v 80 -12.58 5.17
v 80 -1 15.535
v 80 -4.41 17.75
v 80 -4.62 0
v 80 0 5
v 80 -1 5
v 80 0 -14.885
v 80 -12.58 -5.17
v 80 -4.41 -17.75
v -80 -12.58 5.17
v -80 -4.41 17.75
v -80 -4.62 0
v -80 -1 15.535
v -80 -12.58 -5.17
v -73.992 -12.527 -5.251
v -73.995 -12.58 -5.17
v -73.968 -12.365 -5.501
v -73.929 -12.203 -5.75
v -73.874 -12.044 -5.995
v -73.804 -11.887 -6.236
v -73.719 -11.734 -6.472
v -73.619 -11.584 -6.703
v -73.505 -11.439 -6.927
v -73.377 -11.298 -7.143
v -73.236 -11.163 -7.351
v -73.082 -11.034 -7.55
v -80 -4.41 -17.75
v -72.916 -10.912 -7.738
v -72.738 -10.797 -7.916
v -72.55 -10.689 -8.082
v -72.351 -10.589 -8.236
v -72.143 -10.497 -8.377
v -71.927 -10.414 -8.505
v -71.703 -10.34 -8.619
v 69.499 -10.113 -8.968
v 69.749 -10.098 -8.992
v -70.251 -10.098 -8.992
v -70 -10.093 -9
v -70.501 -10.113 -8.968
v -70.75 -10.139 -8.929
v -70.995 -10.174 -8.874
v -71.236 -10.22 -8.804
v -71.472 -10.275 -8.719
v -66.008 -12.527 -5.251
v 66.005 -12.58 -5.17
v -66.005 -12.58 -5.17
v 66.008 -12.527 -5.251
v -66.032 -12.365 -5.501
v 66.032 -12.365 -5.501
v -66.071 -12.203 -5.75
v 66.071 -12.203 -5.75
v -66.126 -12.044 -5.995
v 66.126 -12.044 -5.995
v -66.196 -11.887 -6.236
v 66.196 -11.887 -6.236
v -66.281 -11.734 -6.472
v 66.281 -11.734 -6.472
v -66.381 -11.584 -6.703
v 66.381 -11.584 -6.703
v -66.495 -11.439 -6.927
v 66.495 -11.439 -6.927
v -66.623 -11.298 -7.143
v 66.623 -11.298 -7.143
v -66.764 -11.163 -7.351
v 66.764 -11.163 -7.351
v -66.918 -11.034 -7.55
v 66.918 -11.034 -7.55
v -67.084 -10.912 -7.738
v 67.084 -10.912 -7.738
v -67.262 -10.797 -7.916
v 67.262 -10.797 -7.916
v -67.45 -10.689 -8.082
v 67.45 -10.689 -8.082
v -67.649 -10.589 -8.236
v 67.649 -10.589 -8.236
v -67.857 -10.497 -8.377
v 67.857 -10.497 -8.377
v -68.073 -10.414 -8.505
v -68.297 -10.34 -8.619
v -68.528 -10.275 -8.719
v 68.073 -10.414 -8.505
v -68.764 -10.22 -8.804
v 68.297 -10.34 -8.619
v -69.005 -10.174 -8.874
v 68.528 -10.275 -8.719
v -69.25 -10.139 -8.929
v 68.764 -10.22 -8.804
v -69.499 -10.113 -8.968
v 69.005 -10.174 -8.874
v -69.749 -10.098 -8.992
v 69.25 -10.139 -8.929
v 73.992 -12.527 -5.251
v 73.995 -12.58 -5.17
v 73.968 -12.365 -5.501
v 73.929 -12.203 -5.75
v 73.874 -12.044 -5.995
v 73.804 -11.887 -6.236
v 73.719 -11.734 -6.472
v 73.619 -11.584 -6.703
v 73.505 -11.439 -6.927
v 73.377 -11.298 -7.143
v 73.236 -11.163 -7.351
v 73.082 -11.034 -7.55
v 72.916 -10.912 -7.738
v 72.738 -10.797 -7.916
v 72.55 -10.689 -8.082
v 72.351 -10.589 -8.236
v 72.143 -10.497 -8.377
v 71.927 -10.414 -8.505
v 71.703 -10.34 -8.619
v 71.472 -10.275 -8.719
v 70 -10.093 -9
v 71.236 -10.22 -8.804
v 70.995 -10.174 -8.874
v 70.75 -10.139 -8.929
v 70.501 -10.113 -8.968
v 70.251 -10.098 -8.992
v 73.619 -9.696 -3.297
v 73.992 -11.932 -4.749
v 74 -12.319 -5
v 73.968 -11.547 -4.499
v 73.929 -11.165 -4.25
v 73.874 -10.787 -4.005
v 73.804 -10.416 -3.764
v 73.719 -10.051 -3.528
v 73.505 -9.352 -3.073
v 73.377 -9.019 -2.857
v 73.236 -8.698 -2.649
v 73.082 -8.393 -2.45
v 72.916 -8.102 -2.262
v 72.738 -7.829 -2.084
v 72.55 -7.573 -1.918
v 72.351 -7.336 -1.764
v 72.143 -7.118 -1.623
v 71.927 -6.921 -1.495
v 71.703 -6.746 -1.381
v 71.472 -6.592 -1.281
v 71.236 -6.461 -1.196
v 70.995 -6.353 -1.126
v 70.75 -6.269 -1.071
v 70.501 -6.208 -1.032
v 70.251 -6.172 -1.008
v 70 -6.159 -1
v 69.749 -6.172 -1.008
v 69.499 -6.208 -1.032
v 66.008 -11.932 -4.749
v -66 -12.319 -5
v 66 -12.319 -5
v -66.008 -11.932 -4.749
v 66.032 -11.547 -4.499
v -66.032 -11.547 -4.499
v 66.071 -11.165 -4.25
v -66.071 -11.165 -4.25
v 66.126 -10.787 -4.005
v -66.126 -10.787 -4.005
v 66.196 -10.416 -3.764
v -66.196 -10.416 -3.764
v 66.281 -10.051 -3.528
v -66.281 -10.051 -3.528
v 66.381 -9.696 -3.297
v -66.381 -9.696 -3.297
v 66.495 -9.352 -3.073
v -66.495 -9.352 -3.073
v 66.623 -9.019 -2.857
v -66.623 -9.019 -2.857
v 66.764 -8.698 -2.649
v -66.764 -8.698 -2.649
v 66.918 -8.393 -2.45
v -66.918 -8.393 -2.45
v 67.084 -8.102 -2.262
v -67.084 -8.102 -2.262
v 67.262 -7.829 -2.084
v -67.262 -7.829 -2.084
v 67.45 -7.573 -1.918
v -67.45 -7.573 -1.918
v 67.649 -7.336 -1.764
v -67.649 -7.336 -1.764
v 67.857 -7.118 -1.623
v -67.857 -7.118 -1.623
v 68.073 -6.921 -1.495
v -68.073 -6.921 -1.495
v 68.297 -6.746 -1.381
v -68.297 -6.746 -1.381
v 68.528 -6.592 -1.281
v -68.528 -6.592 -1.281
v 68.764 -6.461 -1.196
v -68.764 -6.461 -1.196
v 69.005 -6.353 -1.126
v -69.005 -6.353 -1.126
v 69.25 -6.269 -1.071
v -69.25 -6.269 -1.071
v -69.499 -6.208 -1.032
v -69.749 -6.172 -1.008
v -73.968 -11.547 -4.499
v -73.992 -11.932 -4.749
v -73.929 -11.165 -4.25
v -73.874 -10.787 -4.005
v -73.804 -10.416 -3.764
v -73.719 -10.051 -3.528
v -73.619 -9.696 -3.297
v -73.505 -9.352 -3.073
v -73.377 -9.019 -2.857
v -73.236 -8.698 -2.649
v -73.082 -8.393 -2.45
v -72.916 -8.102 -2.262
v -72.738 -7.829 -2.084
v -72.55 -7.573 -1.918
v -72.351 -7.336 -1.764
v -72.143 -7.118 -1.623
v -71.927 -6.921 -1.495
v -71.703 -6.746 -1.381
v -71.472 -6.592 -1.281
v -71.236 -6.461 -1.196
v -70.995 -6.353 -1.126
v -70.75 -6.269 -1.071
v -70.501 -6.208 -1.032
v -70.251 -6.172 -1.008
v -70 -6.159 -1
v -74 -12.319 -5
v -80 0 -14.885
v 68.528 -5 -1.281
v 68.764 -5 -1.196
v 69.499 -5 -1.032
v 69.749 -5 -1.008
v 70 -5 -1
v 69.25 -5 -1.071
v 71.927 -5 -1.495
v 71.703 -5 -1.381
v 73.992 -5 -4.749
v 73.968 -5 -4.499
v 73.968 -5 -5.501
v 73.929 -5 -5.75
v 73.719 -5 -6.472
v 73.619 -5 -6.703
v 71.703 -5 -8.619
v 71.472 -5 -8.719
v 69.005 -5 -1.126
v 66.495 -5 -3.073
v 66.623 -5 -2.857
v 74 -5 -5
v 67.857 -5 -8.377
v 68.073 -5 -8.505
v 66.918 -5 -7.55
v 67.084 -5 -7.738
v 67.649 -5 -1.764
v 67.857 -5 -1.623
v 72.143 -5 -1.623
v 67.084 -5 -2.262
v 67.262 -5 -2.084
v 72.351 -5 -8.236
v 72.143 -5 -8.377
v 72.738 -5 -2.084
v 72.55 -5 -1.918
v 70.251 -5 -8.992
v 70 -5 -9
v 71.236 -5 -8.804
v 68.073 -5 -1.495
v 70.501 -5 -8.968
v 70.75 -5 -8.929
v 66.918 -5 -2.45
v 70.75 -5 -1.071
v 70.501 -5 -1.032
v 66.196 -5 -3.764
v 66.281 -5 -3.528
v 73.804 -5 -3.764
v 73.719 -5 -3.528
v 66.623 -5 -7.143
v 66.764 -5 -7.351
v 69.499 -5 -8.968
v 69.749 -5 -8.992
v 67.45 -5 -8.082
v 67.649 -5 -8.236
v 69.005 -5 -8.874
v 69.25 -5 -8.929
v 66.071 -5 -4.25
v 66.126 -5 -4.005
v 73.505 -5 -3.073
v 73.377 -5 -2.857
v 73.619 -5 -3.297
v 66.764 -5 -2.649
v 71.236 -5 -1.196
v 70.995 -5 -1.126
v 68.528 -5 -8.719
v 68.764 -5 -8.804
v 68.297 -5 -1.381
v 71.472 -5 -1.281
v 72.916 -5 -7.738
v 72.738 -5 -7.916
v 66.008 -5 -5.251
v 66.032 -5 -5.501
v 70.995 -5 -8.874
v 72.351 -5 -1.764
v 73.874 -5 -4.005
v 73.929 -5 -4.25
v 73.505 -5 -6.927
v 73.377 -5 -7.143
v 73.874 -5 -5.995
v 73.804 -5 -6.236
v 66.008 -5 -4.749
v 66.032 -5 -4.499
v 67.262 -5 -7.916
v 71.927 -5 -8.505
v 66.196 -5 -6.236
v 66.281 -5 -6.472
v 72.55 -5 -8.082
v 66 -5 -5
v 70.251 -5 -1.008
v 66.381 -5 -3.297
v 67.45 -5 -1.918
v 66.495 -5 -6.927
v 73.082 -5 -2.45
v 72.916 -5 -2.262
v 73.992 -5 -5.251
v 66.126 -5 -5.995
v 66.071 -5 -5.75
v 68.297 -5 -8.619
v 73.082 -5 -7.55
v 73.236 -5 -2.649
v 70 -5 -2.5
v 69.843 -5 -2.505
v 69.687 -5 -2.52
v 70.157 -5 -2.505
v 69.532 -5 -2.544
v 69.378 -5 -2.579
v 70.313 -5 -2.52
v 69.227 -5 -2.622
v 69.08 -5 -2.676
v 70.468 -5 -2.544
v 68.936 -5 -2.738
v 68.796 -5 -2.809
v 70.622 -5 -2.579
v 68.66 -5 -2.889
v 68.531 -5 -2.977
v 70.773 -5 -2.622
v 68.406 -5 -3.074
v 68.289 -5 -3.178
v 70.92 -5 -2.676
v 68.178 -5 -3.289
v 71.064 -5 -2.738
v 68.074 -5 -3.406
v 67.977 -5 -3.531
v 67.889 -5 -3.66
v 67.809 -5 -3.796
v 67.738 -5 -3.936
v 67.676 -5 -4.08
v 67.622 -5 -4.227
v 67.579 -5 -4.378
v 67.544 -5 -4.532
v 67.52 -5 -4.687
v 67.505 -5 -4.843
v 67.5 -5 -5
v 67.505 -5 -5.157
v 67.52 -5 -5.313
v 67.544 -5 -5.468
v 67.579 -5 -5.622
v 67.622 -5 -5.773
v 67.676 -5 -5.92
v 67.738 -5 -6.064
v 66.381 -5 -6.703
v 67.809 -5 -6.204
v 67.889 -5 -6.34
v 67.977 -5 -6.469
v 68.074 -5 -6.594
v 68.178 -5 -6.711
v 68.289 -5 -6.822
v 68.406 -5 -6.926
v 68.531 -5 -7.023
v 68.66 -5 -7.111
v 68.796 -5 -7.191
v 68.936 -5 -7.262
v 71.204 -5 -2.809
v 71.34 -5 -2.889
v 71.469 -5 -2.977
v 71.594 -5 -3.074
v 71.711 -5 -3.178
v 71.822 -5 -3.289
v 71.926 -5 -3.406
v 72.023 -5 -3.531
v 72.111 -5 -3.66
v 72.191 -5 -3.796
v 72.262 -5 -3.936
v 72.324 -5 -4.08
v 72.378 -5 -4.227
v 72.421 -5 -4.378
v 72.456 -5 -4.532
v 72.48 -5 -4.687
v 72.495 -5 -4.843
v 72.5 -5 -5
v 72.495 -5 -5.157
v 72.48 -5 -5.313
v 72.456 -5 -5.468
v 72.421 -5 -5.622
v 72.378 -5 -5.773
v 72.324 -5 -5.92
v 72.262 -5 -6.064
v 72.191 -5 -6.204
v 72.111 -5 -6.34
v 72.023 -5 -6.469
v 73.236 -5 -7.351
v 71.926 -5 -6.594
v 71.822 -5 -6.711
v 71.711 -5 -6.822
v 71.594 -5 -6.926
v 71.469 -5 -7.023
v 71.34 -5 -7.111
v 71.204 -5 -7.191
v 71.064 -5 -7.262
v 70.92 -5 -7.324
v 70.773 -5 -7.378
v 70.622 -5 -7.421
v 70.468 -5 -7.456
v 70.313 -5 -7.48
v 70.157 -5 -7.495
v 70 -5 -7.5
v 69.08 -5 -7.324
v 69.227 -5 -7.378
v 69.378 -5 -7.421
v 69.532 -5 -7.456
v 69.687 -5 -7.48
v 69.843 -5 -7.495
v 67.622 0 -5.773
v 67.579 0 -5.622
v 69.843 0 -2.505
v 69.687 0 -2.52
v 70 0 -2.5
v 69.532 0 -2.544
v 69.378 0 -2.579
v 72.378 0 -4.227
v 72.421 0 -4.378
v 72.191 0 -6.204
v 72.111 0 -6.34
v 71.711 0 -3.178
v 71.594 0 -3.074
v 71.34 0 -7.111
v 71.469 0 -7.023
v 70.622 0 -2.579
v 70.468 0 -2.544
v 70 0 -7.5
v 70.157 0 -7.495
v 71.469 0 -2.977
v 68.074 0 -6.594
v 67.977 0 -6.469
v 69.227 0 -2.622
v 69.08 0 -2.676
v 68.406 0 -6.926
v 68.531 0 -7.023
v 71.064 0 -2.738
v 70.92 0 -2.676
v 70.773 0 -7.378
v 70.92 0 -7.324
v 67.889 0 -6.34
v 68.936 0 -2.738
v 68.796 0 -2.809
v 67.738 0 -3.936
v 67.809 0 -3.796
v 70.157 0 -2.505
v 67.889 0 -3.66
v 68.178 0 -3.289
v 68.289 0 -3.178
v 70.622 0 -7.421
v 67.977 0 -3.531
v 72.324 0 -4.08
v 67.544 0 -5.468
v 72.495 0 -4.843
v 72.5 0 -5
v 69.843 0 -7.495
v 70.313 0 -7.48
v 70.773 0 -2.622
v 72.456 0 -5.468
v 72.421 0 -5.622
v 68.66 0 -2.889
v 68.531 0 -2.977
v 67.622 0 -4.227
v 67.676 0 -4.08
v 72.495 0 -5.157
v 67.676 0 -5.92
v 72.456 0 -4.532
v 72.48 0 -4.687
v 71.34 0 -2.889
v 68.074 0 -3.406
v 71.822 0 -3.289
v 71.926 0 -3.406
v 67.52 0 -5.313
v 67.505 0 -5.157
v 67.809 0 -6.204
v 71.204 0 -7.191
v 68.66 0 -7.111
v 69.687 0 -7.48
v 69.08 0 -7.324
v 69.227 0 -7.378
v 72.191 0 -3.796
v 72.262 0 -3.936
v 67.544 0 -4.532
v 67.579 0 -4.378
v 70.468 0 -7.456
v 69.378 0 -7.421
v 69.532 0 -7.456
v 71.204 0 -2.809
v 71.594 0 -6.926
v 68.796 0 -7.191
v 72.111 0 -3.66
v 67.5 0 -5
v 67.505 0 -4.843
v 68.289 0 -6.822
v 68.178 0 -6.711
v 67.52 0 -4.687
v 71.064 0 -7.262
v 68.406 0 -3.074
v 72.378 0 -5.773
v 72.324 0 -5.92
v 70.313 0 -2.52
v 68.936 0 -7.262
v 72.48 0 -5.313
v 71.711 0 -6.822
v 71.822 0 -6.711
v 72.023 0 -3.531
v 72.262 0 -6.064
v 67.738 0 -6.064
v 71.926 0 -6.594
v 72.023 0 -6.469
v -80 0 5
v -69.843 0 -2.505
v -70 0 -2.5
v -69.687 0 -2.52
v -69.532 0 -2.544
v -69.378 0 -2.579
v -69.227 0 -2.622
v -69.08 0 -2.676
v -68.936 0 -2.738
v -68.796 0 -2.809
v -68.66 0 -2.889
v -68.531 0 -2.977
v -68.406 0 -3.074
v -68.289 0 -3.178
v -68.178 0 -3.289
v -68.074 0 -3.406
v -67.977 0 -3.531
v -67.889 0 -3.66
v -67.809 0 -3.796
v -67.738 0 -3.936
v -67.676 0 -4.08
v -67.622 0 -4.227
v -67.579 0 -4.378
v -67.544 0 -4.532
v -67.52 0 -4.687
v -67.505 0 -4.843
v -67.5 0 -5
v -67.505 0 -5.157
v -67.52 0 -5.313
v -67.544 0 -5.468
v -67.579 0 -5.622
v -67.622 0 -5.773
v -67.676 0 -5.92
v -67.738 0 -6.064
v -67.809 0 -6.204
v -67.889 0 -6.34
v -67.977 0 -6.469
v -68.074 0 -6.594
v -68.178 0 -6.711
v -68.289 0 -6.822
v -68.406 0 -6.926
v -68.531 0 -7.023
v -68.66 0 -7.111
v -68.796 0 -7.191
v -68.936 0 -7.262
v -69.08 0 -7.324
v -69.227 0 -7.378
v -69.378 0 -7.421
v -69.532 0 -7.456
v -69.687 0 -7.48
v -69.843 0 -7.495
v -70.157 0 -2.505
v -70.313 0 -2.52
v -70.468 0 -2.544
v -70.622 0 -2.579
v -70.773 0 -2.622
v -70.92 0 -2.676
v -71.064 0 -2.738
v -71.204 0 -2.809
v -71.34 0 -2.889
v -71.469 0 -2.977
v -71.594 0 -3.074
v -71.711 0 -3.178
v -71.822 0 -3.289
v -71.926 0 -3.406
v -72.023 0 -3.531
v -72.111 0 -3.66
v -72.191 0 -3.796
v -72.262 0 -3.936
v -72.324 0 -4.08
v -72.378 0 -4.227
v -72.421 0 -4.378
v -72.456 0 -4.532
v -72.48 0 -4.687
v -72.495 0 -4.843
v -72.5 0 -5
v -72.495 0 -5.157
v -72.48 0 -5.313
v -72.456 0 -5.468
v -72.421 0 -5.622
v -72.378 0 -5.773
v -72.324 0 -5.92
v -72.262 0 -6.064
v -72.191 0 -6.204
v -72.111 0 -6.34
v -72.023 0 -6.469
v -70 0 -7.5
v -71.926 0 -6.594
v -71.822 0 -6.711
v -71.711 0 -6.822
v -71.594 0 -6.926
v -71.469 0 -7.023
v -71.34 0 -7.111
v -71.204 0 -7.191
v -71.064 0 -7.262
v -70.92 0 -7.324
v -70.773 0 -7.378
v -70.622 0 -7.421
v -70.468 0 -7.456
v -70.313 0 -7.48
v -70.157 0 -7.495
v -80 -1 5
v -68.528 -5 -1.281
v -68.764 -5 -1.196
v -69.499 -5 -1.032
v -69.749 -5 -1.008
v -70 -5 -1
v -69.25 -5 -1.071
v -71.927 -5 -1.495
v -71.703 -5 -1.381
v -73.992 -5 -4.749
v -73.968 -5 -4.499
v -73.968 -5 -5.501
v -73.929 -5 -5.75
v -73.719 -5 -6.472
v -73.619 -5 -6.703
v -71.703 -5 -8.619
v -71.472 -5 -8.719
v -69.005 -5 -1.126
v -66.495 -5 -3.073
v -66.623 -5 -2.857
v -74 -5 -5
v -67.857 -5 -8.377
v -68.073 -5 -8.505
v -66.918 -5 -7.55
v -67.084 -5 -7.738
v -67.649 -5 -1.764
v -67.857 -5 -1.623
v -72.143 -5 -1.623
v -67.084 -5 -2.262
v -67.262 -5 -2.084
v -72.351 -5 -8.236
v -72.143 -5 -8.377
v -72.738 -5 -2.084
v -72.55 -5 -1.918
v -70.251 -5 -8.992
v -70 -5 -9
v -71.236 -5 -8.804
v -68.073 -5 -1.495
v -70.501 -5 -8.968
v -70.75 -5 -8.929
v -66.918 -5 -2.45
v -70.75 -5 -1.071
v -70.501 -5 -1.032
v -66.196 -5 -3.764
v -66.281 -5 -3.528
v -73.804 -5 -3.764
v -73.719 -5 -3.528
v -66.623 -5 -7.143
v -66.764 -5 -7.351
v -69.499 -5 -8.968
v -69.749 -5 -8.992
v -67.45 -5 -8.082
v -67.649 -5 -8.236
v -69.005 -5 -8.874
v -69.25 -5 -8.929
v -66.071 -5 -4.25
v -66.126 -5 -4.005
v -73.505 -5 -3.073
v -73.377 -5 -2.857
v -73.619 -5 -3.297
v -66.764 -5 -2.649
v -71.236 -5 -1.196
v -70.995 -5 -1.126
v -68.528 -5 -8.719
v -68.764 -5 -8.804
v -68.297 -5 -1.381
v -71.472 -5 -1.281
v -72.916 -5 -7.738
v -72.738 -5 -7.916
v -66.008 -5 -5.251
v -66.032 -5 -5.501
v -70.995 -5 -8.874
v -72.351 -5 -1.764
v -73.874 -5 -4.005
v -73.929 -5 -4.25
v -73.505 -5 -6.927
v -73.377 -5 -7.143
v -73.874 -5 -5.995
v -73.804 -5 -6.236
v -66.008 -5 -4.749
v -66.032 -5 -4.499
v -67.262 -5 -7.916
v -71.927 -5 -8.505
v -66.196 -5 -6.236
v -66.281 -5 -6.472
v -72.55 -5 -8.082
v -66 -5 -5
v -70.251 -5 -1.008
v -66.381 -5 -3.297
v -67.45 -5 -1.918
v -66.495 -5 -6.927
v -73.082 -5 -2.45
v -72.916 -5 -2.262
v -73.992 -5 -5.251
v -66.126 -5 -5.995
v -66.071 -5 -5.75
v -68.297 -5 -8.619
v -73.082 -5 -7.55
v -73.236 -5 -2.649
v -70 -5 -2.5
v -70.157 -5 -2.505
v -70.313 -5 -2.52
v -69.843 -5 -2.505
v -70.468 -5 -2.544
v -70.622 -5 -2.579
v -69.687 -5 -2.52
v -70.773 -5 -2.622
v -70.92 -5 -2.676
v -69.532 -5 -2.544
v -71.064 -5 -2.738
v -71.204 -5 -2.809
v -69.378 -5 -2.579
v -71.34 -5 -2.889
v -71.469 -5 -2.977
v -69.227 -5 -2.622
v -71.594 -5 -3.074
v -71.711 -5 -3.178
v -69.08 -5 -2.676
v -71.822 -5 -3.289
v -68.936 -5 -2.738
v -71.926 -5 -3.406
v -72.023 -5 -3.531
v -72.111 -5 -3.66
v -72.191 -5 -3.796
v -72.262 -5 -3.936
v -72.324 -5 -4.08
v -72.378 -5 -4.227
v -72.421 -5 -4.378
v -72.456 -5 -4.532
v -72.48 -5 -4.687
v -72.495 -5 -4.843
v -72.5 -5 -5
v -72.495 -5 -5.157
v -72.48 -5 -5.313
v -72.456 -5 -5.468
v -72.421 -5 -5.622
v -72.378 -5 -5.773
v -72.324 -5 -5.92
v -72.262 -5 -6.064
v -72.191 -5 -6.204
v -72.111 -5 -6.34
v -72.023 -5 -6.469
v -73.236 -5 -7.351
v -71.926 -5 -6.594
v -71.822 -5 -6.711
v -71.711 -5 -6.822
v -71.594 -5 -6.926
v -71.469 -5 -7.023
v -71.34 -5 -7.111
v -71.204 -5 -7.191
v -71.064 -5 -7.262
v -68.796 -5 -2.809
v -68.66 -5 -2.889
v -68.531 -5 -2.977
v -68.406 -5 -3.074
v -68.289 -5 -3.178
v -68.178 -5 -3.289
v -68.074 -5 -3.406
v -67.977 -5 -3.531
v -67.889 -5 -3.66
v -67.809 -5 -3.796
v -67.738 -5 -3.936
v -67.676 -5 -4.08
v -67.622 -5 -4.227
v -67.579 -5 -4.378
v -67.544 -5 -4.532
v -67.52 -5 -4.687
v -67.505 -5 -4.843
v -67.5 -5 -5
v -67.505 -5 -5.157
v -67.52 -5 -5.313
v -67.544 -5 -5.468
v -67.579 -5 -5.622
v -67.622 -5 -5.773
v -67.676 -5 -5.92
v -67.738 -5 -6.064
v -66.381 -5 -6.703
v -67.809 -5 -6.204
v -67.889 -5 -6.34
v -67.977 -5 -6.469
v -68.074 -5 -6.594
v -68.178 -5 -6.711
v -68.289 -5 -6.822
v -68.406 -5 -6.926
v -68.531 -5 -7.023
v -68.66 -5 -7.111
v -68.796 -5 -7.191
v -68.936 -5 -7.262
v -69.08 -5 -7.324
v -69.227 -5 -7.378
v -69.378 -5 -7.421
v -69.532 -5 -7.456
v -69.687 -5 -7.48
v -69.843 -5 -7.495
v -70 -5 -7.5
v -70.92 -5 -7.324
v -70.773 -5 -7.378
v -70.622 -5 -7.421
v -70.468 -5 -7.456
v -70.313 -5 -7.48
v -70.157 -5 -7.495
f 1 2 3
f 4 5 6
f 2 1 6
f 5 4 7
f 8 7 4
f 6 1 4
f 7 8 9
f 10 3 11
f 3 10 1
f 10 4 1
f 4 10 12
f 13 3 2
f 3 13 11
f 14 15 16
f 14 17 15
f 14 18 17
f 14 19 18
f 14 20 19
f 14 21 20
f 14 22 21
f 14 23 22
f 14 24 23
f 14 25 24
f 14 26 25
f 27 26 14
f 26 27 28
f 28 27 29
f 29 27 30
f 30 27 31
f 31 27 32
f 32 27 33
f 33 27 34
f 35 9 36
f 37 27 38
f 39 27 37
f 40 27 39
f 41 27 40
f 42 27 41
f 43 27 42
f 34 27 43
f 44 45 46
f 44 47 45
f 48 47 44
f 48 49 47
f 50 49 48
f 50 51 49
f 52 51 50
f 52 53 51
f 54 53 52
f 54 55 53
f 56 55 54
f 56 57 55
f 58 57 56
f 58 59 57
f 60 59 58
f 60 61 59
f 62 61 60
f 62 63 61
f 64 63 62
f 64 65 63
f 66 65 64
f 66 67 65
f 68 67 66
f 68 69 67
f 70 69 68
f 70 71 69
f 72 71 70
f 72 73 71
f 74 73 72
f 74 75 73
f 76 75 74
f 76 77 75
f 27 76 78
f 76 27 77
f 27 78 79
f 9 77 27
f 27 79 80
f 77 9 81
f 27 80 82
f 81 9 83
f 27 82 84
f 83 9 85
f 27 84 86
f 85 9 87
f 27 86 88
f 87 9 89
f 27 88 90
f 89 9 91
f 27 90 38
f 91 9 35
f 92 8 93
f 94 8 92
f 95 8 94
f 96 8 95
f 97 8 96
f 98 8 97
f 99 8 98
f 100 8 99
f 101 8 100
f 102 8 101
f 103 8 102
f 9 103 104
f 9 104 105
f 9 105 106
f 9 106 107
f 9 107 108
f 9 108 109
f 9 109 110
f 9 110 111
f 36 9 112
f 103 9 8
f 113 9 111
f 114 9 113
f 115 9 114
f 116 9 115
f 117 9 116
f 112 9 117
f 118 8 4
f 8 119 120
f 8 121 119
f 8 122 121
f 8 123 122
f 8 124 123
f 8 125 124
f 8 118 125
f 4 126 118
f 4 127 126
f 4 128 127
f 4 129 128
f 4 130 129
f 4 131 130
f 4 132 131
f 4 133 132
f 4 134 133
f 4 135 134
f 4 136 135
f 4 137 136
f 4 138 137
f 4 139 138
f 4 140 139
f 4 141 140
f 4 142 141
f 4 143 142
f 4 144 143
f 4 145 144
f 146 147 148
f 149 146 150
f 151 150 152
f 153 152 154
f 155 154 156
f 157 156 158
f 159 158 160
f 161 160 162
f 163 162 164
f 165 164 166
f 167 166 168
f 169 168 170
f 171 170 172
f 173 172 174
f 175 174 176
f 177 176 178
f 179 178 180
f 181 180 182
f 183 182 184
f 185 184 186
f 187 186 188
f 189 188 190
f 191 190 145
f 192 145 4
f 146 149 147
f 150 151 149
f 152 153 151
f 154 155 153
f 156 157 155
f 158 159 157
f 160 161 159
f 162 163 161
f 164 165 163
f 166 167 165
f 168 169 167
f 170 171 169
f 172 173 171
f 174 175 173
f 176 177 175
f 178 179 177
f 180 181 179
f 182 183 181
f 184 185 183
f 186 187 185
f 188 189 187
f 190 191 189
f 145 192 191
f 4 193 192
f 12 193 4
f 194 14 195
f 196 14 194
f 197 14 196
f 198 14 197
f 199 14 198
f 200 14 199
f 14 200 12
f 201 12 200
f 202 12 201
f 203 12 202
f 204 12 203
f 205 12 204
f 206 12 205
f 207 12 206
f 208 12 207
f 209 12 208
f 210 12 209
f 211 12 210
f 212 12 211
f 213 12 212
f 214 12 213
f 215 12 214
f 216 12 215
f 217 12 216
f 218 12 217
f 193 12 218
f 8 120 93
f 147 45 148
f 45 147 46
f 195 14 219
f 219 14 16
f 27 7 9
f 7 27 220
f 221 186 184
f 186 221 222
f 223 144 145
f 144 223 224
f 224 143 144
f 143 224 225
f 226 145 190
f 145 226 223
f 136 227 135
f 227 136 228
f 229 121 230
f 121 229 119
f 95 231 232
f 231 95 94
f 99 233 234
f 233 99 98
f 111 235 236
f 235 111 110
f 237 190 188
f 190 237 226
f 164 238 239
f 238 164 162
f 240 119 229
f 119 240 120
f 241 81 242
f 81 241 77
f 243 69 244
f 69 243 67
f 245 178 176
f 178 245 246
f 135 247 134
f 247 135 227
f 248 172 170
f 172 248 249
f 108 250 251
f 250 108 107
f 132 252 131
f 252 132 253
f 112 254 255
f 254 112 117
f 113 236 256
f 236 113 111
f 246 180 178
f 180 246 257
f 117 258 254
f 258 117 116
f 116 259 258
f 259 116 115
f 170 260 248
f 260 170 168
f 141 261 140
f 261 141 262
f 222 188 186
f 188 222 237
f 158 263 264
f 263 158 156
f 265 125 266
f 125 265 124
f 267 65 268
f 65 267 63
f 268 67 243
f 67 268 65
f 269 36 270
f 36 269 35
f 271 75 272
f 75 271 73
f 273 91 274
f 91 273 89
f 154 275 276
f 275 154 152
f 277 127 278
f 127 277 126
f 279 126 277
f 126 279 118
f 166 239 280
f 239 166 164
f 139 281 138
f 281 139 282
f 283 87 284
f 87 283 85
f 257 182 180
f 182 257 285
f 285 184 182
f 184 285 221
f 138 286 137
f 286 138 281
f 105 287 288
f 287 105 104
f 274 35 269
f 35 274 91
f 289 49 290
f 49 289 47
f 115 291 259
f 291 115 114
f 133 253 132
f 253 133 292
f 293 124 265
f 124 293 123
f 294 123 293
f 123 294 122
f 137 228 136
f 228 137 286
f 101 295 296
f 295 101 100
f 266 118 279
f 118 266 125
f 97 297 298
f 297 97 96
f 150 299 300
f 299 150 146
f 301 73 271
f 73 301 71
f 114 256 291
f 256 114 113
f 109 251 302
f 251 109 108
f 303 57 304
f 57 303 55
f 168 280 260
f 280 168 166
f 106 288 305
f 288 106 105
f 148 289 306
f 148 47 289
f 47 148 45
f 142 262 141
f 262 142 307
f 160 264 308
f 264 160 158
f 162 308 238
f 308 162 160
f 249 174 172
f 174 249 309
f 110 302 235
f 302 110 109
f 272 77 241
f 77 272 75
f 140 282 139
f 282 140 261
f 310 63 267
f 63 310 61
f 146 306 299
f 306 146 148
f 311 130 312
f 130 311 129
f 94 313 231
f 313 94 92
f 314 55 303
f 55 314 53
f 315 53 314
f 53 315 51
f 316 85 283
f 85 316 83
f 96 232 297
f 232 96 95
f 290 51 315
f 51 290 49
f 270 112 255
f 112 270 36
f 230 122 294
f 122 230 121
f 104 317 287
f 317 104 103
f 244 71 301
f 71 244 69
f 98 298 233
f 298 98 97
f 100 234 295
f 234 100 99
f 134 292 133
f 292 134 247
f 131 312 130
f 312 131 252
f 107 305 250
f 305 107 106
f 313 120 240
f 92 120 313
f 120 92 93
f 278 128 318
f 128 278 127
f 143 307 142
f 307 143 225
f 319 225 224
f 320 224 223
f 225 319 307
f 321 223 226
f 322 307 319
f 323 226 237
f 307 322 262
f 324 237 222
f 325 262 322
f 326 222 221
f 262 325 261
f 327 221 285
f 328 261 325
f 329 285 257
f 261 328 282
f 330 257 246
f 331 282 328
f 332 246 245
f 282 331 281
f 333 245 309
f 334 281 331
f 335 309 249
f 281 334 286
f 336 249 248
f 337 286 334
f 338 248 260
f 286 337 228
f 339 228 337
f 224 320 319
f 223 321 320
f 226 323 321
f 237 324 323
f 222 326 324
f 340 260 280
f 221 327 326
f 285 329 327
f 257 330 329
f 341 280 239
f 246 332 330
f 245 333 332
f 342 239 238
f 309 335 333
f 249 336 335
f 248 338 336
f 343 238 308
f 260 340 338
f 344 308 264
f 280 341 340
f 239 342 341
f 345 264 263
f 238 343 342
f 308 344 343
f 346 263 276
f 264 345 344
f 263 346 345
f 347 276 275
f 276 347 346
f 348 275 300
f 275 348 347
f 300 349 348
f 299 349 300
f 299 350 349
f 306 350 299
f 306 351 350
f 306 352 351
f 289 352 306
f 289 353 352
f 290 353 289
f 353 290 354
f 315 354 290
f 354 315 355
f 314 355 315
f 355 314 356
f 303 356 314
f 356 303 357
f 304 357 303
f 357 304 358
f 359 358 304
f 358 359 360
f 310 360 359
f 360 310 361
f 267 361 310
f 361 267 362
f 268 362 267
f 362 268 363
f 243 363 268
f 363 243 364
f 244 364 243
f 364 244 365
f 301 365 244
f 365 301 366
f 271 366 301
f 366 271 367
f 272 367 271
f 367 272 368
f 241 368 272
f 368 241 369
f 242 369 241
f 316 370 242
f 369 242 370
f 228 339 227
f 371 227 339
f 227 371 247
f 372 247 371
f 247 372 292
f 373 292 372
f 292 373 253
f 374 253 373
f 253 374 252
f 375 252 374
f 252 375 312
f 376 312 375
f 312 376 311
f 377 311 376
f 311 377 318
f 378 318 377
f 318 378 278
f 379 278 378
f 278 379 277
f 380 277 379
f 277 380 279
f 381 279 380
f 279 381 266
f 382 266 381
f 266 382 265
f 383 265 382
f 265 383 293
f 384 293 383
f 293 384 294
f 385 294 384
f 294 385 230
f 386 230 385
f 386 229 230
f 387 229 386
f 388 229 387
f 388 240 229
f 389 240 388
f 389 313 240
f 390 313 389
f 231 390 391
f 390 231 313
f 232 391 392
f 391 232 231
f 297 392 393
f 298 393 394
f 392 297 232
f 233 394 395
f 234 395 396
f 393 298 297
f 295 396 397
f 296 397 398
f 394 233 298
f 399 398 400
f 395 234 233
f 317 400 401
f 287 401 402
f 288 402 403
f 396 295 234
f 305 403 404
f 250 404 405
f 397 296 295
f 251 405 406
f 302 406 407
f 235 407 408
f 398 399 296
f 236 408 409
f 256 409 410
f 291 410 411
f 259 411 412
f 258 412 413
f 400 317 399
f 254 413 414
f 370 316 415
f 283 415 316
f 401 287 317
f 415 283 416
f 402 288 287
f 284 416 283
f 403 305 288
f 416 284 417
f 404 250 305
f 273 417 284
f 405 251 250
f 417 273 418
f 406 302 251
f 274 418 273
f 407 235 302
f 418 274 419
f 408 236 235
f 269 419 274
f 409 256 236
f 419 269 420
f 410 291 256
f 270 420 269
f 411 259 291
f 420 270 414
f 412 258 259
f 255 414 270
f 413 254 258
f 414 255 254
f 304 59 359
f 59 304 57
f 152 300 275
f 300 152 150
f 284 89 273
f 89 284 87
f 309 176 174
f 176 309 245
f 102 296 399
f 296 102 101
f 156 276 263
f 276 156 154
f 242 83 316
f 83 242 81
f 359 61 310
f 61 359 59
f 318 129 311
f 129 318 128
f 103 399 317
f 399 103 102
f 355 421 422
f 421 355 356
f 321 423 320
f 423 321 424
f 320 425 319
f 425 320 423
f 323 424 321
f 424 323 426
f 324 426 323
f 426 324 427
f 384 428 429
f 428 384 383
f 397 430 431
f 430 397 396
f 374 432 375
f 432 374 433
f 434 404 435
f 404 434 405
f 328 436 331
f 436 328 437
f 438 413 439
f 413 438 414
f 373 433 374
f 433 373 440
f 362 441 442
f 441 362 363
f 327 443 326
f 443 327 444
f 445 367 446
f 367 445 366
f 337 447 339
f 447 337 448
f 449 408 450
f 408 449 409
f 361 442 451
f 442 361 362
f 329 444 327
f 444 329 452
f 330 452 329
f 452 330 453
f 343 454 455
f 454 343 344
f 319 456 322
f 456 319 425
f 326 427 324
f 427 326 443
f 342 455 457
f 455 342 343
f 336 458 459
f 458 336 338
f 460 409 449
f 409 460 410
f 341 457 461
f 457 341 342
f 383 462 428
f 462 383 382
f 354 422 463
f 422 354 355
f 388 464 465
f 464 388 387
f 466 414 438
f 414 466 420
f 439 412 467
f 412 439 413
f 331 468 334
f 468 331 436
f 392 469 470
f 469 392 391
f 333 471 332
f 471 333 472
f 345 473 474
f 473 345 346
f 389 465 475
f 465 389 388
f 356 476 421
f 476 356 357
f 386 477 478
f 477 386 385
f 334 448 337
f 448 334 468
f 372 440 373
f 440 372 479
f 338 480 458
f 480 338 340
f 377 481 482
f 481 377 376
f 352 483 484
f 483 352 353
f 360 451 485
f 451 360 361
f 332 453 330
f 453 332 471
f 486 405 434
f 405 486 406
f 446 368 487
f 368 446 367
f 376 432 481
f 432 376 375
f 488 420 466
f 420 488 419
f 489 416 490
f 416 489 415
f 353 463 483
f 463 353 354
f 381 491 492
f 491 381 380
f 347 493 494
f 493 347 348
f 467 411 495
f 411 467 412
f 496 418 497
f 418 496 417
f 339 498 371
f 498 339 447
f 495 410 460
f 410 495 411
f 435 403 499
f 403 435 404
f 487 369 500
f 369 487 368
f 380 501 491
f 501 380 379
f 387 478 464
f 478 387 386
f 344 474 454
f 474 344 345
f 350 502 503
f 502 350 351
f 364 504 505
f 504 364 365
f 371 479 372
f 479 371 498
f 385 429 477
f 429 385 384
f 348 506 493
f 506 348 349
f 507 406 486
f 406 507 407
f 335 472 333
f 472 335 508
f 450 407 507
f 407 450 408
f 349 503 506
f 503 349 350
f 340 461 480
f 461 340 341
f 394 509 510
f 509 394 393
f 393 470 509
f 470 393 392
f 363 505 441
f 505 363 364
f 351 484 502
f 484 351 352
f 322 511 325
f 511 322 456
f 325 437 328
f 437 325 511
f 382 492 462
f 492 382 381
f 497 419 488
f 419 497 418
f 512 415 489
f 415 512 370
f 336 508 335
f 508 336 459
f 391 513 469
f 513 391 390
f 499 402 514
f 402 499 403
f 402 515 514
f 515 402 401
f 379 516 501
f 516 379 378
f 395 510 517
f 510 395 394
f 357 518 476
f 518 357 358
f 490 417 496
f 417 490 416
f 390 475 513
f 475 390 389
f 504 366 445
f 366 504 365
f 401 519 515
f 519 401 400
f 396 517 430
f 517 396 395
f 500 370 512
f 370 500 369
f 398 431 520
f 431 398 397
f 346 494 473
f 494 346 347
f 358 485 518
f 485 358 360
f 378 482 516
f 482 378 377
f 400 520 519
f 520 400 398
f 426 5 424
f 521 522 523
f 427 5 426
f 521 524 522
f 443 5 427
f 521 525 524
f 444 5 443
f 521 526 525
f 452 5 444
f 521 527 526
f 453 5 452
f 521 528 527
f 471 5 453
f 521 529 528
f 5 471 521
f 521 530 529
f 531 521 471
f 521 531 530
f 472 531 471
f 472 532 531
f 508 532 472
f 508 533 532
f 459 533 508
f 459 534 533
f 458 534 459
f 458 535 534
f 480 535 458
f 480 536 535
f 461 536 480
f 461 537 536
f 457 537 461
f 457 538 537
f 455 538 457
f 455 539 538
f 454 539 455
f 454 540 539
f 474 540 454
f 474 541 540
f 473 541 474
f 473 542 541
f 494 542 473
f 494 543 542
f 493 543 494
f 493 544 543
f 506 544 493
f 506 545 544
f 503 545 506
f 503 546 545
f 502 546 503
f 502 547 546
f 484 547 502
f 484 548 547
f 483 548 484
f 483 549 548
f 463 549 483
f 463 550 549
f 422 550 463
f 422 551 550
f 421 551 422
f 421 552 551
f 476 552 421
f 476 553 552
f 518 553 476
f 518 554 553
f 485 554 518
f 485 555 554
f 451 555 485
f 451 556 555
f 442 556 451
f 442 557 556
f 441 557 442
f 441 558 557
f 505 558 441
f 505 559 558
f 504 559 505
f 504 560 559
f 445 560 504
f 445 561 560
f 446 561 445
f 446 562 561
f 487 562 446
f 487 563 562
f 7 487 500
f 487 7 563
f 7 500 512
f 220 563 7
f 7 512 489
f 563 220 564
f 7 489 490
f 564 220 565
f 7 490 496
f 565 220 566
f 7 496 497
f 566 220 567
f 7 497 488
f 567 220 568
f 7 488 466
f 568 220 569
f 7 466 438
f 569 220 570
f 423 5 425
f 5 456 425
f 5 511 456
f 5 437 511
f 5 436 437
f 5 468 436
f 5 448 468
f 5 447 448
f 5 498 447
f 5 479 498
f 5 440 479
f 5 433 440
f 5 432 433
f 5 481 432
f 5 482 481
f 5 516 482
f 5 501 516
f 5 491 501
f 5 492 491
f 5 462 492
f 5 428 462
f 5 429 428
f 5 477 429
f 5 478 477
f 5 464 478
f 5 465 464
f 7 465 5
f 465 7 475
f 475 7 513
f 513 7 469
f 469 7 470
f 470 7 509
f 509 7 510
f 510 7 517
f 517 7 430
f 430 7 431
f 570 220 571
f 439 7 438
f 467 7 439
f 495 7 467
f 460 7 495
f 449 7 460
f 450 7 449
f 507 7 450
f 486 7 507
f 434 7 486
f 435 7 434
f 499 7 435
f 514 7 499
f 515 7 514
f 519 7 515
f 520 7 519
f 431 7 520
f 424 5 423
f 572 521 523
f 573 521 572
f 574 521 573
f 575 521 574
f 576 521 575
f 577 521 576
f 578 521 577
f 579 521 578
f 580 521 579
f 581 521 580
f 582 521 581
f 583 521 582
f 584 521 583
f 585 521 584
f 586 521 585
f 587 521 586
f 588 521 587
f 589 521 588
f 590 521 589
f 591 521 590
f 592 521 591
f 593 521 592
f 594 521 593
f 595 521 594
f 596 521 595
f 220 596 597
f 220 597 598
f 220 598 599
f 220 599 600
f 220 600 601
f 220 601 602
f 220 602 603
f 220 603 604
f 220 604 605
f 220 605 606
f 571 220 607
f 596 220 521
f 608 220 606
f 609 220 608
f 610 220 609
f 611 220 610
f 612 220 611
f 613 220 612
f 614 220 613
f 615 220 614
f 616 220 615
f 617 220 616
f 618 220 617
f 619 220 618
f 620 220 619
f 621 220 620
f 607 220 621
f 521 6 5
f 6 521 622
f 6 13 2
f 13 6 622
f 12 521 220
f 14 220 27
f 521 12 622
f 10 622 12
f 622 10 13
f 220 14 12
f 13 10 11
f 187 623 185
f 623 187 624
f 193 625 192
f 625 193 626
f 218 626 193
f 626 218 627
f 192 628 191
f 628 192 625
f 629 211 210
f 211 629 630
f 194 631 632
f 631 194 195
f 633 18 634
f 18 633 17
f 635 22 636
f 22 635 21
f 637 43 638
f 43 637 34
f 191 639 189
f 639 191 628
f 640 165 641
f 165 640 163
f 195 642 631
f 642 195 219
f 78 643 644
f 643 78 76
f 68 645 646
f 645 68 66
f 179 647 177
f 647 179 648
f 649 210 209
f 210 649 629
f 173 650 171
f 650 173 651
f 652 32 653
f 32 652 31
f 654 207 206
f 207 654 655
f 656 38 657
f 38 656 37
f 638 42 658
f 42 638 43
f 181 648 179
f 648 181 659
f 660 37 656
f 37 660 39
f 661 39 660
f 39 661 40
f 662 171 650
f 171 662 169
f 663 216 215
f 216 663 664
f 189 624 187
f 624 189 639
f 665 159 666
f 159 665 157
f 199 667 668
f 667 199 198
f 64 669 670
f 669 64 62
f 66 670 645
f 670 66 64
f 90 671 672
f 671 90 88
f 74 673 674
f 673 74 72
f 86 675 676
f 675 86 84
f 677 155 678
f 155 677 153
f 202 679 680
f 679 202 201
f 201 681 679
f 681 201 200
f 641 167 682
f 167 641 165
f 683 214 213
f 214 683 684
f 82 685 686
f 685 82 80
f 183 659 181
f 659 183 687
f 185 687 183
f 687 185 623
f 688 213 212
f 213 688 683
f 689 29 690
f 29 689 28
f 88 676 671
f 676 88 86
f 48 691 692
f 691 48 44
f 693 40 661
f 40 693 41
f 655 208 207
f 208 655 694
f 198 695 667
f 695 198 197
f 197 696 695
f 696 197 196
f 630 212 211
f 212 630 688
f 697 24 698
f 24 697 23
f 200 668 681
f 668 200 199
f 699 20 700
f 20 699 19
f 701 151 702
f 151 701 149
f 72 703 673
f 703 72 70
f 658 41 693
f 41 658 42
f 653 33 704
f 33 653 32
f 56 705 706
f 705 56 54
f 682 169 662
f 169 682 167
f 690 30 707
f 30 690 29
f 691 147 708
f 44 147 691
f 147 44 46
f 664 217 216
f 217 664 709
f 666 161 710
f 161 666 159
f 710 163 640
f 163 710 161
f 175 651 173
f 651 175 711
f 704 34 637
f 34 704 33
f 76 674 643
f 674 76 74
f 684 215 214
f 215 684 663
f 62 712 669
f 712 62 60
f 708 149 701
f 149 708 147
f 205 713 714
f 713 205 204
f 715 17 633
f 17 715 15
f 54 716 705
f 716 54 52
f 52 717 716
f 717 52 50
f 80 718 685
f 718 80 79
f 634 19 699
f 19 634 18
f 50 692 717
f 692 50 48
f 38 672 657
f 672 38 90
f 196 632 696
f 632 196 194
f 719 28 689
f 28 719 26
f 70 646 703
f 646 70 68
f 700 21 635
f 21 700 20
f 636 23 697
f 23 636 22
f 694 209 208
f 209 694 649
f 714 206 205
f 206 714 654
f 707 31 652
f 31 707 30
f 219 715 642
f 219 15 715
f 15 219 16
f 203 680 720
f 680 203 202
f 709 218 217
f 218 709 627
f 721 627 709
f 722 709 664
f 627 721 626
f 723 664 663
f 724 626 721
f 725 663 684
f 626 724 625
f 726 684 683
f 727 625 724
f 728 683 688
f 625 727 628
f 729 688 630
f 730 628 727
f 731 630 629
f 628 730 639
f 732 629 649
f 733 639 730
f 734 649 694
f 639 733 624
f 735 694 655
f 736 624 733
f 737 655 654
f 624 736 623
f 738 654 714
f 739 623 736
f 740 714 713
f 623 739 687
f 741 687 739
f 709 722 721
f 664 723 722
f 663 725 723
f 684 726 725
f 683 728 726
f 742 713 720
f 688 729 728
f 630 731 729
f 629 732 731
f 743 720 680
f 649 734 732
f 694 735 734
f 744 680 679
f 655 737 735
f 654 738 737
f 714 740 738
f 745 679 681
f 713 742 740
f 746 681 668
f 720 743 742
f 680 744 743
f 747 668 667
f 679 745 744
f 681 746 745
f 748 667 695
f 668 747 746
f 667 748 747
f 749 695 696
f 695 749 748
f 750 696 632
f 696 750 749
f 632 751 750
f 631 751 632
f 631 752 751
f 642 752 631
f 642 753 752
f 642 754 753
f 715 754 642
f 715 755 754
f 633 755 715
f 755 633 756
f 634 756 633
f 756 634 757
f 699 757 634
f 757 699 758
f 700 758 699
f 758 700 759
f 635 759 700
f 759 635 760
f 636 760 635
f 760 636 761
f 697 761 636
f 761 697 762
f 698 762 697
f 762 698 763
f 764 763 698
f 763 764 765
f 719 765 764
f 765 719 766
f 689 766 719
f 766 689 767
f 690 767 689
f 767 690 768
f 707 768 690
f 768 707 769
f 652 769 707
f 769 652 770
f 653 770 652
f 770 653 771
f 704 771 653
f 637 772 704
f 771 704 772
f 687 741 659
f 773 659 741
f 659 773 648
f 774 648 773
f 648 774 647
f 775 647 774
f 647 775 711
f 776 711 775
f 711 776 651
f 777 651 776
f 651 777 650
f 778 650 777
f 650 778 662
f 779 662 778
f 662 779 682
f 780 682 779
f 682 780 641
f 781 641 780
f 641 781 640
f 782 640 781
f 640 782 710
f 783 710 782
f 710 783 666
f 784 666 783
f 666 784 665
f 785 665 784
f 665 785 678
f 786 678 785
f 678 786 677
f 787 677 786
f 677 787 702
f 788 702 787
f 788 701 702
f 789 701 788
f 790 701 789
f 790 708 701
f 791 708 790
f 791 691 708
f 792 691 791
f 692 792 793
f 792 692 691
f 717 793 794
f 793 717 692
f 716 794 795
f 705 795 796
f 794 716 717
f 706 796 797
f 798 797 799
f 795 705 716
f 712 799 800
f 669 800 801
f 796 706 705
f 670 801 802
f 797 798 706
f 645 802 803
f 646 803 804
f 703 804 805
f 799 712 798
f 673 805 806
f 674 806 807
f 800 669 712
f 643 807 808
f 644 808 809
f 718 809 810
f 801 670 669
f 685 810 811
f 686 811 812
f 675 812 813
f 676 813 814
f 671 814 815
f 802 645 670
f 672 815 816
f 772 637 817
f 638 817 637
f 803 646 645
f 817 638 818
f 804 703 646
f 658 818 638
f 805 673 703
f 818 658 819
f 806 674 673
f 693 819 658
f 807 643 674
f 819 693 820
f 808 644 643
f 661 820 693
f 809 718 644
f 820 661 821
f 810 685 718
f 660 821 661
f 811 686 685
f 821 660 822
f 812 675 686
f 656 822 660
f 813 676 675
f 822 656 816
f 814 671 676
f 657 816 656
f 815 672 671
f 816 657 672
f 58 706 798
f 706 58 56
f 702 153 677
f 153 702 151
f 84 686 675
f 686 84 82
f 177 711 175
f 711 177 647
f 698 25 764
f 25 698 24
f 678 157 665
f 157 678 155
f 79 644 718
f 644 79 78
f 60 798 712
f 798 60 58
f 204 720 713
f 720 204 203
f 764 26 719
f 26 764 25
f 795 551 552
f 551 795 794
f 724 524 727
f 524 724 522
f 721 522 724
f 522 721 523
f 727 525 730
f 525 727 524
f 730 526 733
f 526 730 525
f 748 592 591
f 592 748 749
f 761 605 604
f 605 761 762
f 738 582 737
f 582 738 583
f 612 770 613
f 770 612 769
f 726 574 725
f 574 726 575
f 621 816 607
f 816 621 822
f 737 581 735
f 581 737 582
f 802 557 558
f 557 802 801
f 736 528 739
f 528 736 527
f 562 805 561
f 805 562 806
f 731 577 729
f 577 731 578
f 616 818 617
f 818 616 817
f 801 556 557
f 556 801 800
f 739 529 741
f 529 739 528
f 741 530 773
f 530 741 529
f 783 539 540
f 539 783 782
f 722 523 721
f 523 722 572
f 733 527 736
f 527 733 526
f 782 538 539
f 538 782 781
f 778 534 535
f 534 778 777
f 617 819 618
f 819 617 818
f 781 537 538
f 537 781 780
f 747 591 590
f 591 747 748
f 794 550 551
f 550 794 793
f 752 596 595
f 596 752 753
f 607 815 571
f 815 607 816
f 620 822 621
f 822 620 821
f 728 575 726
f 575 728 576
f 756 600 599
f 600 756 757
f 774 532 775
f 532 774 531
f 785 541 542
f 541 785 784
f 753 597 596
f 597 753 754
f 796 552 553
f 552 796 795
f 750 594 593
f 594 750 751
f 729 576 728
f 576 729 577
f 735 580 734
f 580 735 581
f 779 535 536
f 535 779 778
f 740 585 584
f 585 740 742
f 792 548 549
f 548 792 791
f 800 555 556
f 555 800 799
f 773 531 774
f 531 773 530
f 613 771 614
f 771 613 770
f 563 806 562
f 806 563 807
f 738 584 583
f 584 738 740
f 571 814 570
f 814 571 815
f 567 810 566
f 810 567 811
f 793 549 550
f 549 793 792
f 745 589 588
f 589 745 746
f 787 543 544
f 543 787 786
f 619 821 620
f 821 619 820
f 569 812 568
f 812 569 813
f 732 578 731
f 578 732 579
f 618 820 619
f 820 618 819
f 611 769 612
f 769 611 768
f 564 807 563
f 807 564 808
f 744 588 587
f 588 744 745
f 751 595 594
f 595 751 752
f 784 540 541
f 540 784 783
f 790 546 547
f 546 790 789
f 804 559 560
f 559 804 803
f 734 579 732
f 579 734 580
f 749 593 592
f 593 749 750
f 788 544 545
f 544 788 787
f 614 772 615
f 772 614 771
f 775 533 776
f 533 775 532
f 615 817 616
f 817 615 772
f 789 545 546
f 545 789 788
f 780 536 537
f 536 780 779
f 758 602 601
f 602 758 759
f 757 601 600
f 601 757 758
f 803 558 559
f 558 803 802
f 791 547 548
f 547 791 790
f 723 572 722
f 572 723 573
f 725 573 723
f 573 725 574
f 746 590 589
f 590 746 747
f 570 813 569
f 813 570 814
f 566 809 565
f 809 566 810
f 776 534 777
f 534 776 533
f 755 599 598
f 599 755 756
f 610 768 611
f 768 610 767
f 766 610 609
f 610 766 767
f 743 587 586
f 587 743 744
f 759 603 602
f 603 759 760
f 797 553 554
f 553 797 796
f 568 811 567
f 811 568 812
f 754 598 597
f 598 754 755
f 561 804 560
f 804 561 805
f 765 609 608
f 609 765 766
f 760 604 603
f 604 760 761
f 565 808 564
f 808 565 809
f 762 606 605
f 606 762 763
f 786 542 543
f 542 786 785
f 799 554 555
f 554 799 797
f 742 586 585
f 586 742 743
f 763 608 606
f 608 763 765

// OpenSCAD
half();
mirror([1,0,0]) half();

module f() {
    translate([0,0,-3]) rotate([57,0,0]) cube([80,15,15]);
}

module half() {
    difference() {
        union() {
            f();
            mirror([0,0,1]) f();
        }
        translate([-10.1,0,-15]) cube([100, 10, 20.1]);
        translate([-10.1,-1,5]) cube([100, 15, 20]);
        
        translate([70,-5,-5]) rotate([0,270,90]) {
            $fn=100;
            cylinder(h=20, r=4, center=false);
            cylinder(h=50, r=2.5, center=true);
        }
    }
}
